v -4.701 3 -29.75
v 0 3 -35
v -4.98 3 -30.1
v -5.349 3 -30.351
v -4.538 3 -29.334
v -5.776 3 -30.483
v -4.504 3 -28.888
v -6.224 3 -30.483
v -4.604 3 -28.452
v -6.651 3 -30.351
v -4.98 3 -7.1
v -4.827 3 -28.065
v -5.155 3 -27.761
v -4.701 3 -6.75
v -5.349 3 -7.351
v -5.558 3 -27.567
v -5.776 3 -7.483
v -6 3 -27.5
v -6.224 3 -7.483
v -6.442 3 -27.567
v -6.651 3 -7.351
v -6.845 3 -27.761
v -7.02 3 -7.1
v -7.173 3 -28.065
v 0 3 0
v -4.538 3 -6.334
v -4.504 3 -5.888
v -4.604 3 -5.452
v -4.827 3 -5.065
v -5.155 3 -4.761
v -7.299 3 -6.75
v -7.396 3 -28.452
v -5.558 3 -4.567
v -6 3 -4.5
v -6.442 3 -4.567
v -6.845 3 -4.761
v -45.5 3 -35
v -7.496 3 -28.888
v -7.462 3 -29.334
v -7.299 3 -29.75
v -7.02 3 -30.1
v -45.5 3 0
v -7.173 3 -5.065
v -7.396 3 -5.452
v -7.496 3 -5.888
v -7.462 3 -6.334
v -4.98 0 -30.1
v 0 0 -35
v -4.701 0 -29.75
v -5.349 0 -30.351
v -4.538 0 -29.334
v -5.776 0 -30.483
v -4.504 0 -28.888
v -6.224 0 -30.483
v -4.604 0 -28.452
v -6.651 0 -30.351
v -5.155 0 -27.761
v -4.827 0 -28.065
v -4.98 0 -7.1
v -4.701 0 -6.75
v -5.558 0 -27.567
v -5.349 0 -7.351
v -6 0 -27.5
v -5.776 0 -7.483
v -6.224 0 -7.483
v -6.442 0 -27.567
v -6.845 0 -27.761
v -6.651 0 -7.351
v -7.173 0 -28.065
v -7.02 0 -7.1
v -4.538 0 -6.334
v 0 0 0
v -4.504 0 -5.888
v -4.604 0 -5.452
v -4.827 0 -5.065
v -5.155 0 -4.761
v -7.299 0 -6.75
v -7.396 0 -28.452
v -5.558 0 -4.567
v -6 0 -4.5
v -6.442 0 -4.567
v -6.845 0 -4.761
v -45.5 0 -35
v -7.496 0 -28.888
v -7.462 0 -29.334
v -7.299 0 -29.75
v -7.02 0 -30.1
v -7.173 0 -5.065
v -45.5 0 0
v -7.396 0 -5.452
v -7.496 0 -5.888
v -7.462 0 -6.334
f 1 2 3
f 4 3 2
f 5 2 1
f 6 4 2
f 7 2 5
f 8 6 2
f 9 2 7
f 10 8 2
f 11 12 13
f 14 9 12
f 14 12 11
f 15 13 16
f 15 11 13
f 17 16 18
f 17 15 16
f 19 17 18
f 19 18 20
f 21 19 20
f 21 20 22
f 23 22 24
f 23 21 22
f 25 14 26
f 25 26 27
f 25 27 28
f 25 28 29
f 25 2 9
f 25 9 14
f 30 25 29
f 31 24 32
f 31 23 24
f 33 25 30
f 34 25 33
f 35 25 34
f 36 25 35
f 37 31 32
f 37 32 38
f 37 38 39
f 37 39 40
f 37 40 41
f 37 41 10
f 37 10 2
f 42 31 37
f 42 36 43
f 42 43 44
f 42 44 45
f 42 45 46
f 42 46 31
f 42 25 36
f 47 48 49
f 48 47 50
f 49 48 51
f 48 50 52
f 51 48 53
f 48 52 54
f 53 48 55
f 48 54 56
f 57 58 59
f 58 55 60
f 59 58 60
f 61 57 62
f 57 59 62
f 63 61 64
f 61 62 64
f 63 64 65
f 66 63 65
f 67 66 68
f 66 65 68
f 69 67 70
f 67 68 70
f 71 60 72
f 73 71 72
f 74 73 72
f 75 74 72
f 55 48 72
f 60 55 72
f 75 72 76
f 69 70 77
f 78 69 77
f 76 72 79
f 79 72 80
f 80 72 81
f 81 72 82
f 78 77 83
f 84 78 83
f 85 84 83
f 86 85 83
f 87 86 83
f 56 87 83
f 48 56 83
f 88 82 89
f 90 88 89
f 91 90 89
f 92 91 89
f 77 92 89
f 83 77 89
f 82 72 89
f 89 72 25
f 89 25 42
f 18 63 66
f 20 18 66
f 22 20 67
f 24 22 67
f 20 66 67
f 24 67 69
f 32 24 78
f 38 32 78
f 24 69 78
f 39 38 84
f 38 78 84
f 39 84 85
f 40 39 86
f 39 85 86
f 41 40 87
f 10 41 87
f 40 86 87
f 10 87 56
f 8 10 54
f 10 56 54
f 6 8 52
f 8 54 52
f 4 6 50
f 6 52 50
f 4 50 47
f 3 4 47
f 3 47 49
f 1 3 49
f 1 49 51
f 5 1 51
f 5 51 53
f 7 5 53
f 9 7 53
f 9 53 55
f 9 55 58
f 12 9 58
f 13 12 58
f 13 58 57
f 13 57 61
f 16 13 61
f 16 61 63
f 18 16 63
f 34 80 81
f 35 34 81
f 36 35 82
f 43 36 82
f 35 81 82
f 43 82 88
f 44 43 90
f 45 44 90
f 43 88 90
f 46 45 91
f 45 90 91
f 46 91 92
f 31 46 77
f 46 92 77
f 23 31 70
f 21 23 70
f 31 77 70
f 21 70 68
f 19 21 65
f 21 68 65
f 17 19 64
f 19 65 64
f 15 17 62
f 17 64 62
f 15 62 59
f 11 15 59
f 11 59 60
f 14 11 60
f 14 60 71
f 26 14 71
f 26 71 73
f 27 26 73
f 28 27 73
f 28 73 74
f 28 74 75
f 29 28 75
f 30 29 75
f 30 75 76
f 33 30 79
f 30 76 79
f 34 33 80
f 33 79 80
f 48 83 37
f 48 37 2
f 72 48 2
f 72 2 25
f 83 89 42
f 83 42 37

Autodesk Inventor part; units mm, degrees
ref_plane "YZ Plane" through (0, 0, 0) normal (1, 0, 0) x (0, 1, 0)
ref_plane "XZ Plane" through (0, 0, 0) normal (0, 1, 0) x (-1, 0, 0)
ref_plane "XY Plane" through (0, 0, 0) normal (0, 0, 1) x (1, 0, 0)
sketch "Sketch1" plane through (0, 0, 0) normal (0, 1, 0) x (-1, 0, 0)
  point P0 (0, 0)
sketch "Sketch2" plane through (0, 0, 0) normal (0, 1, 0) x (-1, 0, 0)
  line L0 (0, 0) -> (45.5, 0)
  line L1 (45.5, 0) -> (45.5, -35)
  line L2 (45.5, -35) -> (0, -35)
  line L3 (0, -35) -> (0, 0)
  dimension "d0" = 45.5
  dimension "d1" = 35
extrude "Extrusion1" add sketch "Sketch2" along normal blind 3
sketch "Sketch3" plane through (0, 3, 0) normal (0, 1, 0) x (1, 0, 0)
  circle A0 centre (-6, 6) radius 1
  line L0 (-45.5, 0) -> (0, 0) projected
  line L1 (0, 0) -> (0, 35) projected
  circle A1 centre (-6, 29) radius 1
  line L2 (0, 35) -> (-45.5, 35) projected
  dimension "d4" = 2
  dimension "d5" = 6
  dimension "d6" = 6
  dimension "d7" = 2
  dimension "d8" = 6
  dimension "d9" = 6
hole "Hole1" at (-6, 3, -6) at (-6, 3, -29) direction (0, -1, 0) diameter 3 end through all
properties part number "FrontSupport" material "Wood (Birch)"
